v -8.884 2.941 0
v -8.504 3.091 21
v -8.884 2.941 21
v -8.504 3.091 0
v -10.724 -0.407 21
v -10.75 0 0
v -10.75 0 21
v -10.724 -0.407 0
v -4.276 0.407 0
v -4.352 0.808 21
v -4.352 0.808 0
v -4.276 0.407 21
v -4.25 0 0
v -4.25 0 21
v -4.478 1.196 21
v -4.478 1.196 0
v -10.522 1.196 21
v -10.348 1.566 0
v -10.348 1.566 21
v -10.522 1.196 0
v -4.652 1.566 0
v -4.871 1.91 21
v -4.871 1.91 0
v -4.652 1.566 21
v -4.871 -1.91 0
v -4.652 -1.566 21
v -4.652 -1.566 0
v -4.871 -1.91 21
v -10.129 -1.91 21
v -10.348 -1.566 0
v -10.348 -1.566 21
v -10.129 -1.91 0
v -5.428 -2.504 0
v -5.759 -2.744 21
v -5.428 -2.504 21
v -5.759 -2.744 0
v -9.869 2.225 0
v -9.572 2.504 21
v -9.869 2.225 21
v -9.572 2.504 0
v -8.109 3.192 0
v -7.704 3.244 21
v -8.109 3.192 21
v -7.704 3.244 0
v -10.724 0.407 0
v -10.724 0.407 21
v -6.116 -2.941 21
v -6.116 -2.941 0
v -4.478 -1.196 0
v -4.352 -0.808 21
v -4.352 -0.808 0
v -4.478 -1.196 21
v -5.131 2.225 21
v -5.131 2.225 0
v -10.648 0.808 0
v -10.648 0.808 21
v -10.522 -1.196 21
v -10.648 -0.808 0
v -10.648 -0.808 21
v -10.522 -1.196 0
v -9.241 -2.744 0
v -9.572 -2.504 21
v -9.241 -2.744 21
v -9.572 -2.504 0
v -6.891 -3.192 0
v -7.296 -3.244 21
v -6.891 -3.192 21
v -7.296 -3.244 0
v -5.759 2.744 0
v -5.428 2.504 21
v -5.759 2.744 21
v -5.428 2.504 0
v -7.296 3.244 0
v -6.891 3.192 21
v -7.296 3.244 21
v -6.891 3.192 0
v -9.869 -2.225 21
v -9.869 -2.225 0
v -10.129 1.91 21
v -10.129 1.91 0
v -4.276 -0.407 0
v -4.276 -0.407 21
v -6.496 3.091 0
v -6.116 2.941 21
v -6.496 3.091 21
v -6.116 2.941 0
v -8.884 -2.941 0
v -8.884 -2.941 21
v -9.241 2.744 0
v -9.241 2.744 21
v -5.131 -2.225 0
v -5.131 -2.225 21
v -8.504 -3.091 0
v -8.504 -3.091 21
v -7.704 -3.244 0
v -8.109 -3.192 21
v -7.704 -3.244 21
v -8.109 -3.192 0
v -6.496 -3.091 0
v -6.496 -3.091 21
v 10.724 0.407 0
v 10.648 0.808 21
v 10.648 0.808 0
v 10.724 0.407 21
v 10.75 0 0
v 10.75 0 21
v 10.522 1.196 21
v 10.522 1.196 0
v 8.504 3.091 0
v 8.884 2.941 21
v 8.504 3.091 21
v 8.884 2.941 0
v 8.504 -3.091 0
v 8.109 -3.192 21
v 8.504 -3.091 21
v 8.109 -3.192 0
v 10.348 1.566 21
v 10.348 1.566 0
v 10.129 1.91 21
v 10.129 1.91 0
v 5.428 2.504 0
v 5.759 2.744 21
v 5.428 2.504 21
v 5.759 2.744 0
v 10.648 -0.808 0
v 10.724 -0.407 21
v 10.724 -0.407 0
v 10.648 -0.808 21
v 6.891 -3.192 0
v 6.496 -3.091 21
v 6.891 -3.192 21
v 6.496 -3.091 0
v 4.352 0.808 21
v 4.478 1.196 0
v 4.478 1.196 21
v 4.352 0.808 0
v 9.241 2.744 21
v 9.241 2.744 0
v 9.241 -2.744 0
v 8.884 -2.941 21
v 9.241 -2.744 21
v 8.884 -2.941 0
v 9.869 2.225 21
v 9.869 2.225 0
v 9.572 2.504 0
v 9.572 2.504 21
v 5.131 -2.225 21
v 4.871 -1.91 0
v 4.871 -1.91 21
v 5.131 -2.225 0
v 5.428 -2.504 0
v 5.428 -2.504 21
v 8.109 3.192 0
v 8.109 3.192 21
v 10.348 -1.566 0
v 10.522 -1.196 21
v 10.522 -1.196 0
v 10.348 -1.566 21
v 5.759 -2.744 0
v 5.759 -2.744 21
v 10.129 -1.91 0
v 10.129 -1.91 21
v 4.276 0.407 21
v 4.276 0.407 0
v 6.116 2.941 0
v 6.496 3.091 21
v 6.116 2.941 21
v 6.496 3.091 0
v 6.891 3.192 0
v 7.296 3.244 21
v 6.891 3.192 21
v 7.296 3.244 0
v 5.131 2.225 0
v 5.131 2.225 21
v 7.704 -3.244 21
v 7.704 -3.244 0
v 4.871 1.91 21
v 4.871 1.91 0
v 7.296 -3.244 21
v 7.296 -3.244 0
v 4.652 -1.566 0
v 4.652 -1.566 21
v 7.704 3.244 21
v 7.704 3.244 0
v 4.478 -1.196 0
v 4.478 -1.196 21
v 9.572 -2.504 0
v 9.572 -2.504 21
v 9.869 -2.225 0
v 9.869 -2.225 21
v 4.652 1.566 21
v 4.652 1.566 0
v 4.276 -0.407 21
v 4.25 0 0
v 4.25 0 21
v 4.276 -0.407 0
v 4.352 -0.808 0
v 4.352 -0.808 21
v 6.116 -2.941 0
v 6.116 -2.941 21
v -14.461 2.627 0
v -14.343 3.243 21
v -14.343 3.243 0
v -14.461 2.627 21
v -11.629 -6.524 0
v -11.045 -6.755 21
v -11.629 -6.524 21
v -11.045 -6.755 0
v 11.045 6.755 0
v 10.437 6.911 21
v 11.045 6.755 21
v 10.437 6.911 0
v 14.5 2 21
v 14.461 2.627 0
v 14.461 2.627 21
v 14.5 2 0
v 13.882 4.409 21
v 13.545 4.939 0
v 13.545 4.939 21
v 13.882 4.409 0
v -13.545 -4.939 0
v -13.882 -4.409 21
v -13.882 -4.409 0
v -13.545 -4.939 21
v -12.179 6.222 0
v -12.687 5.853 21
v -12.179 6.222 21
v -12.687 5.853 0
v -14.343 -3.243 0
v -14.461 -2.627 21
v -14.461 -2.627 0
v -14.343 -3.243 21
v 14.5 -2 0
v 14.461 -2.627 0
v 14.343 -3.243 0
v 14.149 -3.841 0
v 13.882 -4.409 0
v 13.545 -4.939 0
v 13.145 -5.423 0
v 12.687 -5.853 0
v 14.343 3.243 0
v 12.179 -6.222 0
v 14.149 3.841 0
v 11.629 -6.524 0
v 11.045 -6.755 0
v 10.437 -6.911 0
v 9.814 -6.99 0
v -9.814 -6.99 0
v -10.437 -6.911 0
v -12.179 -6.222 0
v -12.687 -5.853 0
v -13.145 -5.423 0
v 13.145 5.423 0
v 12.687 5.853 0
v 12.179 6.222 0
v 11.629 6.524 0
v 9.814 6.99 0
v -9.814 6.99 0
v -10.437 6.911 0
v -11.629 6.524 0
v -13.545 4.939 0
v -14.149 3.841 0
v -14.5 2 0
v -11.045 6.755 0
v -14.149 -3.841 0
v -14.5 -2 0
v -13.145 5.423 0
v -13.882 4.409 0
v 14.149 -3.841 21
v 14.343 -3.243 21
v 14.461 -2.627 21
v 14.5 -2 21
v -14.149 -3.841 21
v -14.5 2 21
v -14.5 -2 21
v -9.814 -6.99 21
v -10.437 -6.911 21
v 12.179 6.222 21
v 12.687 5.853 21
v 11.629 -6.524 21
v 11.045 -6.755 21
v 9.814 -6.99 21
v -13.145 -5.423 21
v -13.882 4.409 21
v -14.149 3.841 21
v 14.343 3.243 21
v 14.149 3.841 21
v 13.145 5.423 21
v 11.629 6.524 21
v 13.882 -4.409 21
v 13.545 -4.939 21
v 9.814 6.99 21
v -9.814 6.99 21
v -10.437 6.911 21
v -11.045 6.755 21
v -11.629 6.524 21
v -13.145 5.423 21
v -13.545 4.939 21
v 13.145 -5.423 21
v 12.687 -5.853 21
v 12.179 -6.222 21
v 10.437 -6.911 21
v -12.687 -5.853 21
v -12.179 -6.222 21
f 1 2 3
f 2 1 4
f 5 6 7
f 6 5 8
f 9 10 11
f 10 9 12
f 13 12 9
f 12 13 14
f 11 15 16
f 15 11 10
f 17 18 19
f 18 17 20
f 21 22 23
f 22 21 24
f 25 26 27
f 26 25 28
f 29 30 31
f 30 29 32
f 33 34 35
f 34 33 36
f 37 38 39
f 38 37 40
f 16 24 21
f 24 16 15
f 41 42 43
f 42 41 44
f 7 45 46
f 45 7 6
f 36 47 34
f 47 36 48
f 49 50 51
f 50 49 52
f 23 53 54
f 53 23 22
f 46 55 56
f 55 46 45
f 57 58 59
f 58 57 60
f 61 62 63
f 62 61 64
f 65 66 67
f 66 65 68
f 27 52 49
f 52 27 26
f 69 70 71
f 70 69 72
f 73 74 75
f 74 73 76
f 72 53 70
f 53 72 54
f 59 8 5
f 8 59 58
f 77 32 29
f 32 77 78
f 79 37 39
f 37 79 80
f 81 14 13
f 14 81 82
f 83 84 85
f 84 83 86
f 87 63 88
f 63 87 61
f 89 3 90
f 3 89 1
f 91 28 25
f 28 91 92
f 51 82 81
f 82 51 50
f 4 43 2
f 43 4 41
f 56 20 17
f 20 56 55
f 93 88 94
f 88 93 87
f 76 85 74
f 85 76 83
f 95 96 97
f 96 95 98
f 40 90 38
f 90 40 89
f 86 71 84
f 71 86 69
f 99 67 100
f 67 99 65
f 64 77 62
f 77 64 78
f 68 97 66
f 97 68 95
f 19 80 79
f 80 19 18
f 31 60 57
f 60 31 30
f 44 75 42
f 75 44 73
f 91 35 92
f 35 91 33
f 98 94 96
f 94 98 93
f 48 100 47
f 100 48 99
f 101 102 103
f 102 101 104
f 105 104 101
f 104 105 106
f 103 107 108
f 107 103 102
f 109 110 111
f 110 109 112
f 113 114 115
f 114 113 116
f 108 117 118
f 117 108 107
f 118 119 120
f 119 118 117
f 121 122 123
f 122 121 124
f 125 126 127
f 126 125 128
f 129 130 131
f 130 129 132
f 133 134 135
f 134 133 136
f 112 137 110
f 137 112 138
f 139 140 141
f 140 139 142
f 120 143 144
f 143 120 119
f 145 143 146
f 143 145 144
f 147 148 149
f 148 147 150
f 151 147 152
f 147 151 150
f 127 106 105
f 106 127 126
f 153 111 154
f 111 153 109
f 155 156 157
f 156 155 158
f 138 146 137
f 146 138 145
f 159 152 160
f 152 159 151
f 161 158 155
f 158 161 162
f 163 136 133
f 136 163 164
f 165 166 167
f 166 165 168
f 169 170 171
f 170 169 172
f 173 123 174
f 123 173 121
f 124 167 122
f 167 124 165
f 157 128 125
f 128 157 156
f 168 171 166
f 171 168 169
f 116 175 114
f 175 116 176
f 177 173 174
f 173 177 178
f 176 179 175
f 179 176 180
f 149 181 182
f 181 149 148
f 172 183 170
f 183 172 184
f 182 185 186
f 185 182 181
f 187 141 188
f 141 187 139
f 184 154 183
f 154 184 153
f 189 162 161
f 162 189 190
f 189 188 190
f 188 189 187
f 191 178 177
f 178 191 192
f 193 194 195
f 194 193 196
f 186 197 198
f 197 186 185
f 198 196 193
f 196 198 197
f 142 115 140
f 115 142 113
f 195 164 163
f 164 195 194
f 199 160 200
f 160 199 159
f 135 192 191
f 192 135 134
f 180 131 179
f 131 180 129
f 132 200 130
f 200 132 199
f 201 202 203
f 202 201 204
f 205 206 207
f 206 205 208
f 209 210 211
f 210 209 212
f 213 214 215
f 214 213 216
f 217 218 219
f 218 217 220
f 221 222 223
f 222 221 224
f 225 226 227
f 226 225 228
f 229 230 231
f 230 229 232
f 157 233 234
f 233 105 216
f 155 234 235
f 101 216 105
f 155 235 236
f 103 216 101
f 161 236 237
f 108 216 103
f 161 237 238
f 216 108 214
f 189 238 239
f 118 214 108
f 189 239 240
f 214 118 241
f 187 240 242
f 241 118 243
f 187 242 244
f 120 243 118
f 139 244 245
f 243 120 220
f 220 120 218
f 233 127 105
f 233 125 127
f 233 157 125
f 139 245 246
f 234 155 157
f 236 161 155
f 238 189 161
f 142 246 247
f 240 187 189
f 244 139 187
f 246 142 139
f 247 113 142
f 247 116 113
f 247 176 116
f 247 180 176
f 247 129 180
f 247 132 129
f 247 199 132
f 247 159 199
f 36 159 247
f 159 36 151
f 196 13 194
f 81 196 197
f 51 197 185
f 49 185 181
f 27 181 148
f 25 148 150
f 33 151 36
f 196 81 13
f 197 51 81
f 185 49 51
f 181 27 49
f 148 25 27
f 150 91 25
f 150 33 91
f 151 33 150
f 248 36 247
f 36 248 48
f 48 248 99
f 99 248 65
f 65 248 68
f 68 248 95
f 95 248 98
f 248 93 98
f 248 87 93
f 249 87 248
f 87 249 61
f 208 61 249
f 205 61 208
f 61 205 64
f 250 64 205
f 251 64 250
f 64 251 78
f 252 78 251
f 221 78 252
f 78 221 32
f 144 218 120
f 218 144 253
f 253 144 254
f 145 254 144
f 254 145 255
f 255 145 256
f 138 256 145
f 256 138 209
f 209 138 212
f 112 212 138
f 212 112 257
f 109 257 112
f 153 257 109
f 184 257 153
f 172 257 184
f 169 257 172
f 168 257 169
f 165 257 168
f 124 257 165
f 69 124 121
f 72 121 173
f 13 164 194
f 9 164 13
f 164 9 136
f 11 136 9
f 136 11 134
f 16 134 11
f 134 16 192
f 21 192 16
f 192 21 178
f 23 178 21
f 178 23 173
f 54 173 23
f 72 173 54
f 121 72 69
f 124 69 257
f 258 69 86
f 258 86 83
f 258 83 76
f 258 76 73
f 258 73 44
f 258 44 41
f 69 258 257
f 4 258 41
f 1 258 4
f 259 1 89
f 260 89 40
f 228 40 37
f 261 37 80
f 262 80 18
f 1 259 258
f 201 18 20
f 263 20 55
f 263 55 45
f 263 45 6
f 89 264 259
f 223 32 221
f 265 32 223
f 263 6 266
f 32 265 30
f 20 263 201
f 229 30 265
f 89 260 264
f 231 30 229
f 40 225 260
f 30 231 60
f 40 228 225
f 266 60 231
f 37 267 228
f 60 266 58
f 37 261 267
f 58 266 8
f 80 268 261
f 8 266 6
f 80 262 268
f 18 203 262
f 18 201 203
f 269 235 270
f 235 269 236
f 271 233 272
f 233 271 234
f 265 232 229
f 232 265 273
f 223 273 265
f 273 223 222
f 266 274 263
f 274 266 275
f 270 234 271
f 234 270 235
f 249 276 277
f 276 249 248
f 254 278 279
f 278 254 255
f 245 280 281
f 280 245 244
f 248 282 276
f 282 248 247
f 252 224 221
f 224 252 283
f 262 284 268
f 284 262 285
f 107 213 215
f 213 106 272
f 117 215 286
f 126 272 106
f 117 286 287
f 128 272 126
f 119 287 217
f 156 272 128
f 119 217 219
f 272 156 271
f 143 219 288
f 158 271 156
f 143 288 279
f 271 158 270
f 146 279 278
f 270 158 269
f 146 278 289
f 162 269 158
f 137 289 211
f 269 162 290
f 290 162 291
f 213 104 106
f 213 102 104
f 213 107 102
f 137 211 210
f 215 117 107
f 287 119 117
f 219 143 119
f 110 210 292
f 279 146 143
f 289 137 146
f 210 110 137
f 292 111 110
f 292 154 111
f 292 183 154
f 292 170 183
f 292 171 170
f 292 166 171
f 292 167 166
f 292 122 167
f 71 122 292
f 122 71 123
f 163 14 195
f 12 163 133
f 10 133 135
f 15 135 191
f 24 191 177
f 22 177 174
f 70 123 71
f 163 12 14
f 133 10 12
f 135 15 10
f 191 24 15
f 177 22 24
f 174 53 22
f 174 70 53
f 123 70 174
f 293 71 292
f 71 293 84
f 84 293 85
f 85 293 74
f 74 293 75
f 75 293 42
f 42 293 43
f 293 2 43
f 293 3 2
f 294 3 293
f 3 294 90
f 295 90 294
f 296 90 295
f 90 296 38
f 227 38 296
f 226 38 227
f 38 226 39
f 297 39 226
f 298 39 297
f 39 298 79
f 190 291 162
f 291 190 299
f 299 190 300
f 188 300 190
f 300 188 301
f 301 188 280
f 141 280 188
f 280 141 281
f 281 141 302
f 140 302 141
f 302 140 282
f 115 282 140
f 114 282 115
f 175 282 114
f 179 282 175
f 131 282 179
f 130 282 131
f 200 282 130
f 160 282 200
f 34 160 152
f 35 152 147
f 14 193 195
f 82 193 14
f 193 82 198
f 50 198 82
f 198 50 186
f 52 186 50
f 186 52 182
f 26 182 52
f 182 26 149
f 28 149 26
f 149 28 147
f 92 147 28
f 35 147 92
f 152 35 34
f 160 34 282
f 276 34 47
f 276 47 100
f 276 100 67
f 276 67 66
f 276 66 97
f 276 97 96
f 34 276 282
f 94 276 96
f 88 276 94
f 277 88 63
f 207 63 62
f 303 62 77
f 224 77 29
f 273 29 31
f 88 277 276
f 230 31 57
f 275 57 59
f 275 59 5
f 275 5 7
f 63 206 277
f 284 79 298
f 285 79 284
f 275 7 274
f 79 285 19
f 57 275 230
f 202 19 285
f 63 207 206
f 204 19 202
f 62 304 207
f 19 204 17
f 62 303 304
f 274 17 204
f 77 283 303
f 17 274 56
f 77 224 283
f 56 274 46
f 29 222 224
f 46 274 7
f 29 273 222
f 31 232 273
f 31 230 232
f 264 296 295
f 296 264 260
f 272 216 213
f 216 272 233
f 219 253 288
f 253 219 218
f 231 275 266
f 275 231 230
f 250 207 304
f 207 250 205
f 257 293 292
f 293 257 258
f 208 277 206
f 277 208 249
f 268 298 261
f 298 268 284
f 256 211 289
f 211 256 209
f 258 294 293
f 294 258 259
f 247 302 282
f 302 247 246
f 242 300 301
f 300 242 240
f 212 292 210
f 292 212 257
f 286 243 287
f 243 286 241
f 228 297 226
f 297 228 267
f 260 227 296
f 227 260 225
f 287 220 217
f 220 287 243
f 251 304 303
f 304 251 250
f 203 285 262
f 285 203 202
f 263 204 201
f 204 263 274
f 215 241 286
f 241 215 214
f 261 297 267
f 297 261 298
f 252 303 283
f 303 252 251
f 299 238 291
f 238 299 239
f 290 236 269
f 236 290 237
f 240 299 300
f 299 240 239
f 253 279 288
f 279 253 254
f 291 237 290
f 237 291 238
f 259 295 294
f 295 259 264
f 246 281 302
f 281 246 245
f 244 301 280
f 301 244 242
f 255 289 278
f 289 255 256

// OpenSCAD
$fn = 50;


difference() {
	union() {
		hull() {
			translate(v = [-9.5000000000, 2.0000000000, 0]) {
				cylinder(h = 21, r = 5);
			}
			translate(v = [9.5000000000, 2.0000000000, 0]) {
				cylinder(h = 21, r = 5);
			}
			translate(v = [-9.5000000000, -2.0000000000, 0]) {
				cylinder(h = 21, r = 5);
			}
			translate(v = [9.5000000000, -2.0000000000, 0]) {
				cylinder(h = 21, r = 5);
			}
		}
	}
	union() {
		translate(v = [-7.5000000000, 0.0000000000, -100.0000000000]) {
			cylinder(h = 200, r = 3.2500000000);
		}
		translate(v = [7.5000000000, 0.0000000000, -100.0000000000]) {
			cylinder(h = 200, r = 3.2500000000);
		}
	}
}
